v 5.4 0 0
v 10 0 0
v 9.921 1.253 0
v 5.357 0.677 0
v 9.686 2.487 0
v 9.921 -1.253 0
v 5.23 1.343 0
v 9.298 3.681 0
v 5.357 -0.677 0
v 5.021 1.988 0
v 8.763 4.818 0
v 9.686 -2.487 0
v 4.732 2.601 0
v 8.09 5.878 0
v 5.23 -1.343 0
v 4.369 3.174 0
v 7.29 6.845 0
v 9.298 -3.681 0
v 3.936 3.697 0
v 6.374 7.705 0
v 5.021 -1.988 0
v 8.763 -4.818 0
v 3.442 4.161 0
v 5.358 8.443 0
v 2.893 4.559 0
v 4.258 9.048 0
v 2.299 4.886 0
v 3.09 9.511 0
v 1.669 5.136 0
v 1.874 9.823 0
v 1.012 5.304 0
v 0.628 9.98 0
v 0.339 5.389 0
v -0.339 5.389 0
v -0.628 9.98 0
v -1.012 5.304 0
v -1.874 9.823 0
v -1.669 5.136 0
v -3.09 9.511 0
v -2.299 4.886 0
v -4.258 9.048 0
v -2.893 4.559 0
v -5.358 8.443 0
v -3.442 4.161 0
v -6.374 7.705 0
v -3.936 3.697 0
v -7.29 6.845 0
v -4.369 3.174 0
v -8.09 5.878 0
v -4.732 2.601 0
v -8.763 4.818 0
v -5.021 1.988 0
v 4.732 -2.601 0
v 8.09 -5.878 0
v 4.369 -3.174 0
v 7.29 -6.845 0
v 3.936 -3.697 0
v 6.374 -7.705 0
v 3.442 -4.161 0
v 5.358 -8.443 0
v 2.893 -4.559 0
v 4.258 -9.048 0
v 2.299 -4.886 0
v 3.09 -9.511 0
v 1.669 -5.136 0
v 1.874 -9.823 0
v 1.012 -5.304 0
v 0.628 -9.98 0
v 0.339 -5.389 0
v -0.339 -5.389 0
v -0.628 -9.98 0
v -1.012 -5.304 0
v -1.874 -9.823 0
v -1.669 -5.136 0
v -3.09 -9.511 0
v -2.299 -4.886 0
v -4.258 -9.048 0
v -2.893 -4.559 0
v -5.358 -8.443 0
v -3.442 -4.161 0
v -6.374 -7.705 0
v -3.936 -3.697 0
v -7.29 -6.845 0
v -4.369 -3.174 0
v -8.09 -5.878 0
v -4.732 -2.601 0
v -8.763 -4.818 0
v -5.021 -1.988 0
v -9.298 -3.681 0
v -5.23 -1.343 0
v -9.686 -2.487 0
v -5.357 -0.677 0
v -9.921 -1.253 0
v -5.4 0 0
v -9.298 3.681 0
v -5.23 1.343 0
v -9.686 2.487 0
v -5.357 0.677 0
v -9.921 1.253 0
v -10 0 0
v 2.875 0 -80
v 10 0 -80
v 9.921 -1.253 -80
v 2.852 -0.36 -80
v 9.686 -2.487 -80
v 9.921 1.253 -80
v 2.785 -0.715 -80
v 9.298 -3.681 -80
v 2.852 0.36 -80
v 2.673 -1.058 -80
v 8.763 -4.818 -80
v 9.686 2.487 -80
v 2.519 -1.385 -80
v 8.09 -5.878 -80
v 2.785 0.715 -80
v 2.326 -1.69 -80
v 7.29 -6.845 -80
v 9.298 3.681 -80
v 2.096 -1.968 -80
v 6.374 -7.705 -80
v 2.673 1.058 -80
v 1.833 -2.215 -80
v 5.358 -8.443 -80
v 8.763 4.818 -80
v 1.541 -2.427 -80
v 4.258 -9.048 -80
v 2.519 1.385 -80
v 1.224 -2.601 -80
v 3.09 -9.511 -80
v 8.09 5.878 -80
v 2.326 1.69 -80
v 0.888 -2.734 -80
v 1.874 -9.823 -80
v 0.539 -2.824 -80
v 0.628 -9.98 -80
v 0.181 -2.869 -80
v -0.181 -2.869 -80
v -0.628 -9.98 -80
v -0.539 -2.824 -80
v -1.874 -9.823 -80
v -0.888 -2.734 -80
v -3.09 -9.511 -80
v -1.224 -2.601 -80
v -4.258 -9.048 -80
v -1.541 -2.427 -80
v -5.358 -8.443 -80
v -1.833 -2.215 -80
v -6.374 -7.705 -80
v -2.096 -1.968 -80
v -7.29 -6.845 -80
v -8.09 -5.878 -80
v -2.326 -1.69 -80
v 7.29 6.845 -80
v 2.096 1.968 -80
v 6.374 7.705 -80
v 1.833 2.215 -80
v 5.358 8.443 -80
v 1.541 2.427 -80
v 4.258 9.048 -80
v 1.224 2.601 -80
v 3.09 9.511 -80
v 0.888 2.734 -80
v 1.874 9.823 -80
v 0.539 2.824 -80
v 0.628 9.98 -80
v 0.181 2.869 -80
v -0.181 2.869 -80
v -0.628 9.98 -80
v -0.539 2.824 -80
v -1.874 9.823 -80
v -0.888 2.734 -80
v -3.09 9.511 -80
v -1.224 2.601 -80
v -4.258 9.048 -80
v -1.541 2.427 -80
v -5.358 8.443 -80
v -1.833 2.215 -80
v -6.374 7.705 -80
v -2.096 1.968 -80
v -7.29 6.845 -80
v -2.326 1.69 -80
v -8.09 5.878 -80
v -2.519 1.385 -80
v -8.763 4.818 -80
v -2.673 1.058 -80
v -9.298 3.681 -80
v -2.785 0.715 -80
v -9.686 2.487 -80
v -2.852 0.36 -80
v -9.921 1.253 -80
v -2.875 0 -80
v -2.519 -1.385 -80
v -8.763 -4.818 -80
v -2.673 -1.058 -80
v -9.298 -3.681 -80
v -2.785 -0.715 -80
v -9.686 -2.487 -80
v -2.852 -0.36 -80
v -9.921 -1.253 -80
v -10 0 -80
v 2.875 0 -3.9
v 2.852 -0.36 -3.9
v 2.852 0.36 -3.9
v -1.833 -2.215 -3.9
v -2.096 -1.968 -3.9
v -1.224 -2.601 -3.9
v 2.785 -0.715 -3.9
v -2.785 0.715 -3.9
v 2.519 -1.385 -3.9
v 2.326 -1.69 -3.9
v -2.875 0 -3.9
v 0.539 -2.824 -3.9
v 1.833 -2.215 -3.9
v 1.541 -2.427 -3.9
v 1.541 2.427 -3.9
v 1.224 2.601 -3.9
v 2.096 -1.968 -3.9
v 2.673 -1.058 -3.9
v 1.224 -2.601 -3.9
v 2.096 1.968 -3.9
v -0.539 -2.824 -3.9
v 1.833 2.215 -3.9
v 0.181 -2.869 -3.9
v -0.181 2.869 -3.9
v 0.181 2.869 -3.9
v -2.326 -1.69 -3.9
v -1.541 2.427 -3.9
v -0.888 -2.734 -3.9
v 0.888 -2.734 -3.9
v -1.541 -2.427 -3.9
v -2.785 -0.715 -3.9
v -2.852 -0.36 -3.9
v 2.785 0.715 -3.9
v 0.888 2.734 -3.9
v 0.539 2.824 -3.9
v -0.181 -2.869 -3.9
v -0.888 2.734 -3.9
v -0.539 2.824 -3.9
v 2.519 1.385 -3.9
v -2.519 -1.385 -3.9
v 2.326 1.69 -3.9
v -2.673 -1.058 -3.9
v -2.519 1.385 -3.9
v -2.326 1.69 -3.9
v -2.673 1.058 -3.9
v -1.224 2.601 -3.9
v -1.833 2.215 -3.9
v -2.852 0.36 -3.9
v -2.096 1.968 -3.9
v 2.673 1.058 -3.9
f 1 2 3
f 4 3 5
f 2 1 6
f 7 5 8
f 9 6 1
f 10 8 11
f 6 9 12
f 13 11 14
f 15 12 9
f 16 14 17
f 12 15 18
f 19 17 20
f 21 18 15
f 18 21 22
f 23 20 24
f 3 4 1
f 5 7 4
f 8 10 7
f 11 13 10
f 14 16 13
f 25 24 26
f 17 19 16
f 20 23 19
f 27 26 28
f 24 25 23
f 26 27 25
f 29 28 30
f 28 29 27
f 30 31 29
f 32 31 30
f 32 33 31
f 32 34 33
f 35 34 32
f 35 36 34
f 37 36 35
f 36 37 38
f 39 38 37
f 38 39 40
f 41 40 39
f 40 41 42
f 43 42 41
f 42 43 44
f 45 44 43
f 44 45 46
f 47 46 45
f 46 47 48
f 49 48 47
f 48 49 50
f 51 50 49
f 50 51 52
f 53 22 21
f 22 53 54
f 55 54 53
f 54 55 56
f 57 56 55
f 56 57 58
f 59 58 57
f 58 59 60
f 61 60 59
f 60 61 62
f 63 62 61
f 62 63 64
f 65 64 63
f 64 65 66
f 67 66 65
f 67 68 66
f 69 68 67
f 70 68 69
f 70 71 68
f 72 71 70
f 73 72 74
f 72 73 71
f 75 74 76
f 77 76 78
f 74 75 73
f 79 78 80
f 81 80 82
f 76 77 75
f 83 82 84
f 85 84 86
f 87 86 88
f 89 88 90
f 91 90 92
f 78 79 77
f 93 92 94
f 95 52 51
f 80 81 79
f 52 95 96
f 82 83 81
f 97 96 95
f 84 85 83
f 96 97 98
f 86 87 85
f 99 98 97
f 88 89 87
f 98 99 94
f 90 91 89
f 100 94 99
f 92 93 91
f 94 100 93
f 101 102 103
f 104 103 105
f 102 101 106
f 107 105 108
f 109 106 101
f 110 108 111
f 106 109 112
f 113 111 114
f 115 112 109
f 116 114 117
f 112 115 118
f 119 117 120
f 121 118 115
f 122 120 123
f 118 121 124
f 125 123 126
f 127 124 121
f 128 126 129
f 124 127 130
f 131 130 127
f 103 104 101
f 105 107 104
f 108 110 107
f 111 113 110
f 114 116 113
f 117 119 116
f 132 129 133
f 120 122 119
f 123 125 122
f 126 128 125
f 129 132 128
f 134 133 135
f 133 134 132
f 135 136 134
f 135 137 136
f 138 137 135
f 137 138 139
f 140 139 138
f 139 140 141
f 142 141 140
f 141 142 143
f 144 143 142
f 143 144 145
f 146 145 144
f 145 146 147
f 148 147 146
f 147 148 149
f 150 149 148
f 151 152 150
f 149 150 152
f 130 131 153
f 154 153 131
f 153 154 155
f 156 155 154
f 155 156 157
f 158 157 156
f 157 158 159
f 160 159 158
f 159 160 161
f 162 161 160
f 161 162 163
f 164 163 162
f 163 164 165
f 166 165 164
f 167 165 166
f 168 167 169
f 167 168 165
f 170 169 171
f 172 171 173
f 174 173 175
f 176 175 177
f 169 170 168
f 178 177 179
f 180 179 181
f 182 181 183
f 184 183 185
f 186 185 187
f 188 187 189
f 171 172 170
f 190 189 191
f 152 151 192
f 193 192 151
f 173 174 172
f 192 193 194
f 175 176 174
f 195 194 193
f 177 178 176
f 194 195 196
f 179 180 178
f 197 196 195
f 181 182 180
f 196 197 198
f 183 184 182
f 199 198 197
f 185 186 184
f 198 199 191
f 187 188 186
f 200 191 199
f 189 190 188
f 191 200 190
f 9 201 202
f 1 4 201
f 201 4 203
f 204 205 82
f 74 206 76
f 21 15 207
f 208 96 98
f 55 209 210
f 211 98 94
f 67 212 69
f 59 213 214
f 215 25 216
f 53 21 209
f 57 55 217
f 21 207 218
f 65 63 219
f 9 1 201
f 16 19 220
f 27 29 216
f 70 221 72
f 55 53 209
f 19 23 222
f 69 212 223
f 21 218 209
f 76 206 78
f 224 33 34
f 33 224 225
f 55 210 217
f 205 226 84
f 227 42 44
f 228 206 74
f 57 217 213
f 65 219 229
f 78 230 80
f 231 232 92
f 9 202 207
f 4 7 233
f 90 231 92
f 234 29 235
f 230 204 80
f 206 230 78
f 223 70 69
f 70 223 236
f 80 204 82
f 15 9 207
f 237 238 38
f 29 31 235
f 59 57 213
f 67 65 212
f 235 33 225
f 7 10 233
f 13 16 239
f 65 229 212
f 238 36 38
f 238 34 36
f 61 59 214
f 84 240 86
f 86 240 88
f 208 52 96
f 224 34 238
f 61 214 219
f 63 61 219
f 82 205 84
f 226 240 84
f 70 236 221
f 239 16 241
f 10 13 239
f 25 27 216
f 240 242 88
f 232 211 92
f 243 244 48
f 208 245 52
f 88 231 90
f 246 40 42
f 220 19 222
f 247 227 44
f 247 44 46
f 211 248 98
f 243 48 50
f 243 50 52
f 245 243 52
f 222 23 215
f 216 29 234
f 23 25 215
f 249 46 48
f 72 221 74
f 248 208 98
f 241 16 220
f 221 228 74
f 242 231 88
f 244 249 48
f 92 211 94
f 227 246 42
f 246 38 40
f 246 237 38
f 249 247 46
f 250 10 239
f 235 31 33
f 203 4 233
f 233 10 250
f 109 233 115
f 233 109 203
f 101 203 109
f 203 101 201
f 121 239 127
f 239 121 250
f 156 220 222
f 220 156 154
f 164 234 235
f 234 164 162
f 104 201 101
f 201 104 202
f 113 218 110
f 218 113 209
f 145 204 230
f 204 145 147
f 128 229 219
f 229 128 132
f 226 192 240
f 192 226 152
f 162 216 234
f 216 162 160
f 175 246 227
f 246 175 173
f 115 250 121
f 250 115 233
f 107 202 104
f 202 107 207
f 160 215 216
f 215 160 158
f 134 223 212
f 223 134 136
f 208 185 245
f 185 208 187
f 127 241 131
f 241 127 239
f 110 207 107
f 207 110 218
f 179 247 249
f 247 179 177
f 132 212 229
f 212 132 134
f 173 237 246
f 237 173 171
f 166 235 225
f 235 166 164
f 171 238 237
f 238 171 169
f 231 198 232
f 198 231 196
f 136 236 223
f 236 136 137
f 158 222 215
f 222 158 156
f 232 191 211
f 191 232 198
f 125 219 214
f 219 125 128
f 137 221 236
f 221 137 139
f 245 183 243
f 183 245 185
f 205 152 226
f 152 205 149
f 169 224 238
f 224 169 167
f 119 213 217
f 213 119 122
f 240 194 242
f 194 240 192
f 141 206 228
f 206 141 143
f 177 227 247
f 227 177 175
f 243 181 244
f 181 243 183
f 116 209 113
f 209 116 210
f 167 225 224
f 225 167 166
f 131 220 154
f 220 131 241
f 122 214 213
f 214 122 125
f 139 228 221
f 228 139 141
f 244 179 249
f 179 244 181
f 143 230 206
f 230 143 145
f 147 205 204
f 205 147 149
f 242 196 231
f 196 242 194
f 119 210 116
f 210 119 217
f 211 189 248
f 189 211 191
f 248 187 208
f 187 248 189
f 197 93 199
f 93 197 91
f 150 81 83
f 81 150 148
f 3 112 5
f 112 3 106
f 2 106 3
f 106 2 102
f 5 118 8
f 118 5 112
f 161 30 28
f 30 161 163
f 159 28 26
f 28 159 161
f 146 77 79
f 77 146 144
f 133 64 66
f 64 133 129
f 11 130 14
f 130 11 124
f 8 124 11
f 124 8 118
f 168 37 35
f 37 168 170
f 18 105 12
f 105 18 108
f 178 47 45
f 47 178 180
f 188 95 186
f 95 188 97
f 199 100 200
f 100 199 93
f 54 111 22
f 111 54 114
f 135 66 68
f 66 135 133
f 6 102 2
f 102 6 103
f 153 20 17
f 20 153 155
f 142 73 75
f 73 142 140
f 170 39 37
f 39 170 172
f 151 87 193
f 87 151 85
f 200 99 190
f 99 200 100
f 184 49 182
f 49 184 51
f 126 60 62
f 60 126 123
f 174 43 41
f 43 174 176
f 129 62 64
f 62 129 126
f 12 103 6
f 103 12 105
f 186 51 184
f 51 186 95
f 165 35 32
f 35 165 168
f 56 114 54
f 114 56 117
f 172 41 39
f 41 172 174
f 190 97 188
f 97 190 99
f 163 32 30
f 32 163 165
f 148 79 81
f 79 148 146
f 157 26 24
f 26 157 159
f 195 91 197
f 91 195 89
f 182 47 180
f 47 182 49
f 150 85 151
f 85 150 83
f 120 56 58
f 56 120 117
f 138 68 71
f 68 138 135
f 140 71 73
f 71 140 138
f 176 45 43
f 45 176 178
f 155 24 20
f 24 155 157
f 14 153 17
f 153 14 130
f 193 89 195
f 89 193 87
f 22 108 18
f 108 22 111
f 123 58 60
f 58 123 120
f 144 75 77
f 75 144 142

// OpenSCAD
$fn = 50;


difference() {
	union() {
		translate(v = [0, 0, -80.0000000000]) {
			cylinder(h = 80, r = 10.0000000000);
		}
		cylinder(h = 0, r = 19.0000000000);
	}
	union() {
		translate(v = [0, 0, 0]) {
			rotate(a = [0, 0, 0]) {
				difference() {
					union() {
						#translate(v = [0, 0, -80.0000000000]) {
							cylinder(h = 80, r = 2.6000000000);
						}
						#translate(v = [0, 0, -3.9000000000]) {
							cylinder(h = 3.9000000000, r1 = 2.8750000000, r2 = 5.4000000000);
						}
						#translate(v = [0, 0, -80.0000000000]) {
							cylinder(h = 80, r = 2.8750000000);
						}
						#translate(v = [0, 0, -80.0000000000]) {
							cylinder(h = 80, r = 2.6000000000);
						}
					}
					union();
				}
			}
		}
	}
}
